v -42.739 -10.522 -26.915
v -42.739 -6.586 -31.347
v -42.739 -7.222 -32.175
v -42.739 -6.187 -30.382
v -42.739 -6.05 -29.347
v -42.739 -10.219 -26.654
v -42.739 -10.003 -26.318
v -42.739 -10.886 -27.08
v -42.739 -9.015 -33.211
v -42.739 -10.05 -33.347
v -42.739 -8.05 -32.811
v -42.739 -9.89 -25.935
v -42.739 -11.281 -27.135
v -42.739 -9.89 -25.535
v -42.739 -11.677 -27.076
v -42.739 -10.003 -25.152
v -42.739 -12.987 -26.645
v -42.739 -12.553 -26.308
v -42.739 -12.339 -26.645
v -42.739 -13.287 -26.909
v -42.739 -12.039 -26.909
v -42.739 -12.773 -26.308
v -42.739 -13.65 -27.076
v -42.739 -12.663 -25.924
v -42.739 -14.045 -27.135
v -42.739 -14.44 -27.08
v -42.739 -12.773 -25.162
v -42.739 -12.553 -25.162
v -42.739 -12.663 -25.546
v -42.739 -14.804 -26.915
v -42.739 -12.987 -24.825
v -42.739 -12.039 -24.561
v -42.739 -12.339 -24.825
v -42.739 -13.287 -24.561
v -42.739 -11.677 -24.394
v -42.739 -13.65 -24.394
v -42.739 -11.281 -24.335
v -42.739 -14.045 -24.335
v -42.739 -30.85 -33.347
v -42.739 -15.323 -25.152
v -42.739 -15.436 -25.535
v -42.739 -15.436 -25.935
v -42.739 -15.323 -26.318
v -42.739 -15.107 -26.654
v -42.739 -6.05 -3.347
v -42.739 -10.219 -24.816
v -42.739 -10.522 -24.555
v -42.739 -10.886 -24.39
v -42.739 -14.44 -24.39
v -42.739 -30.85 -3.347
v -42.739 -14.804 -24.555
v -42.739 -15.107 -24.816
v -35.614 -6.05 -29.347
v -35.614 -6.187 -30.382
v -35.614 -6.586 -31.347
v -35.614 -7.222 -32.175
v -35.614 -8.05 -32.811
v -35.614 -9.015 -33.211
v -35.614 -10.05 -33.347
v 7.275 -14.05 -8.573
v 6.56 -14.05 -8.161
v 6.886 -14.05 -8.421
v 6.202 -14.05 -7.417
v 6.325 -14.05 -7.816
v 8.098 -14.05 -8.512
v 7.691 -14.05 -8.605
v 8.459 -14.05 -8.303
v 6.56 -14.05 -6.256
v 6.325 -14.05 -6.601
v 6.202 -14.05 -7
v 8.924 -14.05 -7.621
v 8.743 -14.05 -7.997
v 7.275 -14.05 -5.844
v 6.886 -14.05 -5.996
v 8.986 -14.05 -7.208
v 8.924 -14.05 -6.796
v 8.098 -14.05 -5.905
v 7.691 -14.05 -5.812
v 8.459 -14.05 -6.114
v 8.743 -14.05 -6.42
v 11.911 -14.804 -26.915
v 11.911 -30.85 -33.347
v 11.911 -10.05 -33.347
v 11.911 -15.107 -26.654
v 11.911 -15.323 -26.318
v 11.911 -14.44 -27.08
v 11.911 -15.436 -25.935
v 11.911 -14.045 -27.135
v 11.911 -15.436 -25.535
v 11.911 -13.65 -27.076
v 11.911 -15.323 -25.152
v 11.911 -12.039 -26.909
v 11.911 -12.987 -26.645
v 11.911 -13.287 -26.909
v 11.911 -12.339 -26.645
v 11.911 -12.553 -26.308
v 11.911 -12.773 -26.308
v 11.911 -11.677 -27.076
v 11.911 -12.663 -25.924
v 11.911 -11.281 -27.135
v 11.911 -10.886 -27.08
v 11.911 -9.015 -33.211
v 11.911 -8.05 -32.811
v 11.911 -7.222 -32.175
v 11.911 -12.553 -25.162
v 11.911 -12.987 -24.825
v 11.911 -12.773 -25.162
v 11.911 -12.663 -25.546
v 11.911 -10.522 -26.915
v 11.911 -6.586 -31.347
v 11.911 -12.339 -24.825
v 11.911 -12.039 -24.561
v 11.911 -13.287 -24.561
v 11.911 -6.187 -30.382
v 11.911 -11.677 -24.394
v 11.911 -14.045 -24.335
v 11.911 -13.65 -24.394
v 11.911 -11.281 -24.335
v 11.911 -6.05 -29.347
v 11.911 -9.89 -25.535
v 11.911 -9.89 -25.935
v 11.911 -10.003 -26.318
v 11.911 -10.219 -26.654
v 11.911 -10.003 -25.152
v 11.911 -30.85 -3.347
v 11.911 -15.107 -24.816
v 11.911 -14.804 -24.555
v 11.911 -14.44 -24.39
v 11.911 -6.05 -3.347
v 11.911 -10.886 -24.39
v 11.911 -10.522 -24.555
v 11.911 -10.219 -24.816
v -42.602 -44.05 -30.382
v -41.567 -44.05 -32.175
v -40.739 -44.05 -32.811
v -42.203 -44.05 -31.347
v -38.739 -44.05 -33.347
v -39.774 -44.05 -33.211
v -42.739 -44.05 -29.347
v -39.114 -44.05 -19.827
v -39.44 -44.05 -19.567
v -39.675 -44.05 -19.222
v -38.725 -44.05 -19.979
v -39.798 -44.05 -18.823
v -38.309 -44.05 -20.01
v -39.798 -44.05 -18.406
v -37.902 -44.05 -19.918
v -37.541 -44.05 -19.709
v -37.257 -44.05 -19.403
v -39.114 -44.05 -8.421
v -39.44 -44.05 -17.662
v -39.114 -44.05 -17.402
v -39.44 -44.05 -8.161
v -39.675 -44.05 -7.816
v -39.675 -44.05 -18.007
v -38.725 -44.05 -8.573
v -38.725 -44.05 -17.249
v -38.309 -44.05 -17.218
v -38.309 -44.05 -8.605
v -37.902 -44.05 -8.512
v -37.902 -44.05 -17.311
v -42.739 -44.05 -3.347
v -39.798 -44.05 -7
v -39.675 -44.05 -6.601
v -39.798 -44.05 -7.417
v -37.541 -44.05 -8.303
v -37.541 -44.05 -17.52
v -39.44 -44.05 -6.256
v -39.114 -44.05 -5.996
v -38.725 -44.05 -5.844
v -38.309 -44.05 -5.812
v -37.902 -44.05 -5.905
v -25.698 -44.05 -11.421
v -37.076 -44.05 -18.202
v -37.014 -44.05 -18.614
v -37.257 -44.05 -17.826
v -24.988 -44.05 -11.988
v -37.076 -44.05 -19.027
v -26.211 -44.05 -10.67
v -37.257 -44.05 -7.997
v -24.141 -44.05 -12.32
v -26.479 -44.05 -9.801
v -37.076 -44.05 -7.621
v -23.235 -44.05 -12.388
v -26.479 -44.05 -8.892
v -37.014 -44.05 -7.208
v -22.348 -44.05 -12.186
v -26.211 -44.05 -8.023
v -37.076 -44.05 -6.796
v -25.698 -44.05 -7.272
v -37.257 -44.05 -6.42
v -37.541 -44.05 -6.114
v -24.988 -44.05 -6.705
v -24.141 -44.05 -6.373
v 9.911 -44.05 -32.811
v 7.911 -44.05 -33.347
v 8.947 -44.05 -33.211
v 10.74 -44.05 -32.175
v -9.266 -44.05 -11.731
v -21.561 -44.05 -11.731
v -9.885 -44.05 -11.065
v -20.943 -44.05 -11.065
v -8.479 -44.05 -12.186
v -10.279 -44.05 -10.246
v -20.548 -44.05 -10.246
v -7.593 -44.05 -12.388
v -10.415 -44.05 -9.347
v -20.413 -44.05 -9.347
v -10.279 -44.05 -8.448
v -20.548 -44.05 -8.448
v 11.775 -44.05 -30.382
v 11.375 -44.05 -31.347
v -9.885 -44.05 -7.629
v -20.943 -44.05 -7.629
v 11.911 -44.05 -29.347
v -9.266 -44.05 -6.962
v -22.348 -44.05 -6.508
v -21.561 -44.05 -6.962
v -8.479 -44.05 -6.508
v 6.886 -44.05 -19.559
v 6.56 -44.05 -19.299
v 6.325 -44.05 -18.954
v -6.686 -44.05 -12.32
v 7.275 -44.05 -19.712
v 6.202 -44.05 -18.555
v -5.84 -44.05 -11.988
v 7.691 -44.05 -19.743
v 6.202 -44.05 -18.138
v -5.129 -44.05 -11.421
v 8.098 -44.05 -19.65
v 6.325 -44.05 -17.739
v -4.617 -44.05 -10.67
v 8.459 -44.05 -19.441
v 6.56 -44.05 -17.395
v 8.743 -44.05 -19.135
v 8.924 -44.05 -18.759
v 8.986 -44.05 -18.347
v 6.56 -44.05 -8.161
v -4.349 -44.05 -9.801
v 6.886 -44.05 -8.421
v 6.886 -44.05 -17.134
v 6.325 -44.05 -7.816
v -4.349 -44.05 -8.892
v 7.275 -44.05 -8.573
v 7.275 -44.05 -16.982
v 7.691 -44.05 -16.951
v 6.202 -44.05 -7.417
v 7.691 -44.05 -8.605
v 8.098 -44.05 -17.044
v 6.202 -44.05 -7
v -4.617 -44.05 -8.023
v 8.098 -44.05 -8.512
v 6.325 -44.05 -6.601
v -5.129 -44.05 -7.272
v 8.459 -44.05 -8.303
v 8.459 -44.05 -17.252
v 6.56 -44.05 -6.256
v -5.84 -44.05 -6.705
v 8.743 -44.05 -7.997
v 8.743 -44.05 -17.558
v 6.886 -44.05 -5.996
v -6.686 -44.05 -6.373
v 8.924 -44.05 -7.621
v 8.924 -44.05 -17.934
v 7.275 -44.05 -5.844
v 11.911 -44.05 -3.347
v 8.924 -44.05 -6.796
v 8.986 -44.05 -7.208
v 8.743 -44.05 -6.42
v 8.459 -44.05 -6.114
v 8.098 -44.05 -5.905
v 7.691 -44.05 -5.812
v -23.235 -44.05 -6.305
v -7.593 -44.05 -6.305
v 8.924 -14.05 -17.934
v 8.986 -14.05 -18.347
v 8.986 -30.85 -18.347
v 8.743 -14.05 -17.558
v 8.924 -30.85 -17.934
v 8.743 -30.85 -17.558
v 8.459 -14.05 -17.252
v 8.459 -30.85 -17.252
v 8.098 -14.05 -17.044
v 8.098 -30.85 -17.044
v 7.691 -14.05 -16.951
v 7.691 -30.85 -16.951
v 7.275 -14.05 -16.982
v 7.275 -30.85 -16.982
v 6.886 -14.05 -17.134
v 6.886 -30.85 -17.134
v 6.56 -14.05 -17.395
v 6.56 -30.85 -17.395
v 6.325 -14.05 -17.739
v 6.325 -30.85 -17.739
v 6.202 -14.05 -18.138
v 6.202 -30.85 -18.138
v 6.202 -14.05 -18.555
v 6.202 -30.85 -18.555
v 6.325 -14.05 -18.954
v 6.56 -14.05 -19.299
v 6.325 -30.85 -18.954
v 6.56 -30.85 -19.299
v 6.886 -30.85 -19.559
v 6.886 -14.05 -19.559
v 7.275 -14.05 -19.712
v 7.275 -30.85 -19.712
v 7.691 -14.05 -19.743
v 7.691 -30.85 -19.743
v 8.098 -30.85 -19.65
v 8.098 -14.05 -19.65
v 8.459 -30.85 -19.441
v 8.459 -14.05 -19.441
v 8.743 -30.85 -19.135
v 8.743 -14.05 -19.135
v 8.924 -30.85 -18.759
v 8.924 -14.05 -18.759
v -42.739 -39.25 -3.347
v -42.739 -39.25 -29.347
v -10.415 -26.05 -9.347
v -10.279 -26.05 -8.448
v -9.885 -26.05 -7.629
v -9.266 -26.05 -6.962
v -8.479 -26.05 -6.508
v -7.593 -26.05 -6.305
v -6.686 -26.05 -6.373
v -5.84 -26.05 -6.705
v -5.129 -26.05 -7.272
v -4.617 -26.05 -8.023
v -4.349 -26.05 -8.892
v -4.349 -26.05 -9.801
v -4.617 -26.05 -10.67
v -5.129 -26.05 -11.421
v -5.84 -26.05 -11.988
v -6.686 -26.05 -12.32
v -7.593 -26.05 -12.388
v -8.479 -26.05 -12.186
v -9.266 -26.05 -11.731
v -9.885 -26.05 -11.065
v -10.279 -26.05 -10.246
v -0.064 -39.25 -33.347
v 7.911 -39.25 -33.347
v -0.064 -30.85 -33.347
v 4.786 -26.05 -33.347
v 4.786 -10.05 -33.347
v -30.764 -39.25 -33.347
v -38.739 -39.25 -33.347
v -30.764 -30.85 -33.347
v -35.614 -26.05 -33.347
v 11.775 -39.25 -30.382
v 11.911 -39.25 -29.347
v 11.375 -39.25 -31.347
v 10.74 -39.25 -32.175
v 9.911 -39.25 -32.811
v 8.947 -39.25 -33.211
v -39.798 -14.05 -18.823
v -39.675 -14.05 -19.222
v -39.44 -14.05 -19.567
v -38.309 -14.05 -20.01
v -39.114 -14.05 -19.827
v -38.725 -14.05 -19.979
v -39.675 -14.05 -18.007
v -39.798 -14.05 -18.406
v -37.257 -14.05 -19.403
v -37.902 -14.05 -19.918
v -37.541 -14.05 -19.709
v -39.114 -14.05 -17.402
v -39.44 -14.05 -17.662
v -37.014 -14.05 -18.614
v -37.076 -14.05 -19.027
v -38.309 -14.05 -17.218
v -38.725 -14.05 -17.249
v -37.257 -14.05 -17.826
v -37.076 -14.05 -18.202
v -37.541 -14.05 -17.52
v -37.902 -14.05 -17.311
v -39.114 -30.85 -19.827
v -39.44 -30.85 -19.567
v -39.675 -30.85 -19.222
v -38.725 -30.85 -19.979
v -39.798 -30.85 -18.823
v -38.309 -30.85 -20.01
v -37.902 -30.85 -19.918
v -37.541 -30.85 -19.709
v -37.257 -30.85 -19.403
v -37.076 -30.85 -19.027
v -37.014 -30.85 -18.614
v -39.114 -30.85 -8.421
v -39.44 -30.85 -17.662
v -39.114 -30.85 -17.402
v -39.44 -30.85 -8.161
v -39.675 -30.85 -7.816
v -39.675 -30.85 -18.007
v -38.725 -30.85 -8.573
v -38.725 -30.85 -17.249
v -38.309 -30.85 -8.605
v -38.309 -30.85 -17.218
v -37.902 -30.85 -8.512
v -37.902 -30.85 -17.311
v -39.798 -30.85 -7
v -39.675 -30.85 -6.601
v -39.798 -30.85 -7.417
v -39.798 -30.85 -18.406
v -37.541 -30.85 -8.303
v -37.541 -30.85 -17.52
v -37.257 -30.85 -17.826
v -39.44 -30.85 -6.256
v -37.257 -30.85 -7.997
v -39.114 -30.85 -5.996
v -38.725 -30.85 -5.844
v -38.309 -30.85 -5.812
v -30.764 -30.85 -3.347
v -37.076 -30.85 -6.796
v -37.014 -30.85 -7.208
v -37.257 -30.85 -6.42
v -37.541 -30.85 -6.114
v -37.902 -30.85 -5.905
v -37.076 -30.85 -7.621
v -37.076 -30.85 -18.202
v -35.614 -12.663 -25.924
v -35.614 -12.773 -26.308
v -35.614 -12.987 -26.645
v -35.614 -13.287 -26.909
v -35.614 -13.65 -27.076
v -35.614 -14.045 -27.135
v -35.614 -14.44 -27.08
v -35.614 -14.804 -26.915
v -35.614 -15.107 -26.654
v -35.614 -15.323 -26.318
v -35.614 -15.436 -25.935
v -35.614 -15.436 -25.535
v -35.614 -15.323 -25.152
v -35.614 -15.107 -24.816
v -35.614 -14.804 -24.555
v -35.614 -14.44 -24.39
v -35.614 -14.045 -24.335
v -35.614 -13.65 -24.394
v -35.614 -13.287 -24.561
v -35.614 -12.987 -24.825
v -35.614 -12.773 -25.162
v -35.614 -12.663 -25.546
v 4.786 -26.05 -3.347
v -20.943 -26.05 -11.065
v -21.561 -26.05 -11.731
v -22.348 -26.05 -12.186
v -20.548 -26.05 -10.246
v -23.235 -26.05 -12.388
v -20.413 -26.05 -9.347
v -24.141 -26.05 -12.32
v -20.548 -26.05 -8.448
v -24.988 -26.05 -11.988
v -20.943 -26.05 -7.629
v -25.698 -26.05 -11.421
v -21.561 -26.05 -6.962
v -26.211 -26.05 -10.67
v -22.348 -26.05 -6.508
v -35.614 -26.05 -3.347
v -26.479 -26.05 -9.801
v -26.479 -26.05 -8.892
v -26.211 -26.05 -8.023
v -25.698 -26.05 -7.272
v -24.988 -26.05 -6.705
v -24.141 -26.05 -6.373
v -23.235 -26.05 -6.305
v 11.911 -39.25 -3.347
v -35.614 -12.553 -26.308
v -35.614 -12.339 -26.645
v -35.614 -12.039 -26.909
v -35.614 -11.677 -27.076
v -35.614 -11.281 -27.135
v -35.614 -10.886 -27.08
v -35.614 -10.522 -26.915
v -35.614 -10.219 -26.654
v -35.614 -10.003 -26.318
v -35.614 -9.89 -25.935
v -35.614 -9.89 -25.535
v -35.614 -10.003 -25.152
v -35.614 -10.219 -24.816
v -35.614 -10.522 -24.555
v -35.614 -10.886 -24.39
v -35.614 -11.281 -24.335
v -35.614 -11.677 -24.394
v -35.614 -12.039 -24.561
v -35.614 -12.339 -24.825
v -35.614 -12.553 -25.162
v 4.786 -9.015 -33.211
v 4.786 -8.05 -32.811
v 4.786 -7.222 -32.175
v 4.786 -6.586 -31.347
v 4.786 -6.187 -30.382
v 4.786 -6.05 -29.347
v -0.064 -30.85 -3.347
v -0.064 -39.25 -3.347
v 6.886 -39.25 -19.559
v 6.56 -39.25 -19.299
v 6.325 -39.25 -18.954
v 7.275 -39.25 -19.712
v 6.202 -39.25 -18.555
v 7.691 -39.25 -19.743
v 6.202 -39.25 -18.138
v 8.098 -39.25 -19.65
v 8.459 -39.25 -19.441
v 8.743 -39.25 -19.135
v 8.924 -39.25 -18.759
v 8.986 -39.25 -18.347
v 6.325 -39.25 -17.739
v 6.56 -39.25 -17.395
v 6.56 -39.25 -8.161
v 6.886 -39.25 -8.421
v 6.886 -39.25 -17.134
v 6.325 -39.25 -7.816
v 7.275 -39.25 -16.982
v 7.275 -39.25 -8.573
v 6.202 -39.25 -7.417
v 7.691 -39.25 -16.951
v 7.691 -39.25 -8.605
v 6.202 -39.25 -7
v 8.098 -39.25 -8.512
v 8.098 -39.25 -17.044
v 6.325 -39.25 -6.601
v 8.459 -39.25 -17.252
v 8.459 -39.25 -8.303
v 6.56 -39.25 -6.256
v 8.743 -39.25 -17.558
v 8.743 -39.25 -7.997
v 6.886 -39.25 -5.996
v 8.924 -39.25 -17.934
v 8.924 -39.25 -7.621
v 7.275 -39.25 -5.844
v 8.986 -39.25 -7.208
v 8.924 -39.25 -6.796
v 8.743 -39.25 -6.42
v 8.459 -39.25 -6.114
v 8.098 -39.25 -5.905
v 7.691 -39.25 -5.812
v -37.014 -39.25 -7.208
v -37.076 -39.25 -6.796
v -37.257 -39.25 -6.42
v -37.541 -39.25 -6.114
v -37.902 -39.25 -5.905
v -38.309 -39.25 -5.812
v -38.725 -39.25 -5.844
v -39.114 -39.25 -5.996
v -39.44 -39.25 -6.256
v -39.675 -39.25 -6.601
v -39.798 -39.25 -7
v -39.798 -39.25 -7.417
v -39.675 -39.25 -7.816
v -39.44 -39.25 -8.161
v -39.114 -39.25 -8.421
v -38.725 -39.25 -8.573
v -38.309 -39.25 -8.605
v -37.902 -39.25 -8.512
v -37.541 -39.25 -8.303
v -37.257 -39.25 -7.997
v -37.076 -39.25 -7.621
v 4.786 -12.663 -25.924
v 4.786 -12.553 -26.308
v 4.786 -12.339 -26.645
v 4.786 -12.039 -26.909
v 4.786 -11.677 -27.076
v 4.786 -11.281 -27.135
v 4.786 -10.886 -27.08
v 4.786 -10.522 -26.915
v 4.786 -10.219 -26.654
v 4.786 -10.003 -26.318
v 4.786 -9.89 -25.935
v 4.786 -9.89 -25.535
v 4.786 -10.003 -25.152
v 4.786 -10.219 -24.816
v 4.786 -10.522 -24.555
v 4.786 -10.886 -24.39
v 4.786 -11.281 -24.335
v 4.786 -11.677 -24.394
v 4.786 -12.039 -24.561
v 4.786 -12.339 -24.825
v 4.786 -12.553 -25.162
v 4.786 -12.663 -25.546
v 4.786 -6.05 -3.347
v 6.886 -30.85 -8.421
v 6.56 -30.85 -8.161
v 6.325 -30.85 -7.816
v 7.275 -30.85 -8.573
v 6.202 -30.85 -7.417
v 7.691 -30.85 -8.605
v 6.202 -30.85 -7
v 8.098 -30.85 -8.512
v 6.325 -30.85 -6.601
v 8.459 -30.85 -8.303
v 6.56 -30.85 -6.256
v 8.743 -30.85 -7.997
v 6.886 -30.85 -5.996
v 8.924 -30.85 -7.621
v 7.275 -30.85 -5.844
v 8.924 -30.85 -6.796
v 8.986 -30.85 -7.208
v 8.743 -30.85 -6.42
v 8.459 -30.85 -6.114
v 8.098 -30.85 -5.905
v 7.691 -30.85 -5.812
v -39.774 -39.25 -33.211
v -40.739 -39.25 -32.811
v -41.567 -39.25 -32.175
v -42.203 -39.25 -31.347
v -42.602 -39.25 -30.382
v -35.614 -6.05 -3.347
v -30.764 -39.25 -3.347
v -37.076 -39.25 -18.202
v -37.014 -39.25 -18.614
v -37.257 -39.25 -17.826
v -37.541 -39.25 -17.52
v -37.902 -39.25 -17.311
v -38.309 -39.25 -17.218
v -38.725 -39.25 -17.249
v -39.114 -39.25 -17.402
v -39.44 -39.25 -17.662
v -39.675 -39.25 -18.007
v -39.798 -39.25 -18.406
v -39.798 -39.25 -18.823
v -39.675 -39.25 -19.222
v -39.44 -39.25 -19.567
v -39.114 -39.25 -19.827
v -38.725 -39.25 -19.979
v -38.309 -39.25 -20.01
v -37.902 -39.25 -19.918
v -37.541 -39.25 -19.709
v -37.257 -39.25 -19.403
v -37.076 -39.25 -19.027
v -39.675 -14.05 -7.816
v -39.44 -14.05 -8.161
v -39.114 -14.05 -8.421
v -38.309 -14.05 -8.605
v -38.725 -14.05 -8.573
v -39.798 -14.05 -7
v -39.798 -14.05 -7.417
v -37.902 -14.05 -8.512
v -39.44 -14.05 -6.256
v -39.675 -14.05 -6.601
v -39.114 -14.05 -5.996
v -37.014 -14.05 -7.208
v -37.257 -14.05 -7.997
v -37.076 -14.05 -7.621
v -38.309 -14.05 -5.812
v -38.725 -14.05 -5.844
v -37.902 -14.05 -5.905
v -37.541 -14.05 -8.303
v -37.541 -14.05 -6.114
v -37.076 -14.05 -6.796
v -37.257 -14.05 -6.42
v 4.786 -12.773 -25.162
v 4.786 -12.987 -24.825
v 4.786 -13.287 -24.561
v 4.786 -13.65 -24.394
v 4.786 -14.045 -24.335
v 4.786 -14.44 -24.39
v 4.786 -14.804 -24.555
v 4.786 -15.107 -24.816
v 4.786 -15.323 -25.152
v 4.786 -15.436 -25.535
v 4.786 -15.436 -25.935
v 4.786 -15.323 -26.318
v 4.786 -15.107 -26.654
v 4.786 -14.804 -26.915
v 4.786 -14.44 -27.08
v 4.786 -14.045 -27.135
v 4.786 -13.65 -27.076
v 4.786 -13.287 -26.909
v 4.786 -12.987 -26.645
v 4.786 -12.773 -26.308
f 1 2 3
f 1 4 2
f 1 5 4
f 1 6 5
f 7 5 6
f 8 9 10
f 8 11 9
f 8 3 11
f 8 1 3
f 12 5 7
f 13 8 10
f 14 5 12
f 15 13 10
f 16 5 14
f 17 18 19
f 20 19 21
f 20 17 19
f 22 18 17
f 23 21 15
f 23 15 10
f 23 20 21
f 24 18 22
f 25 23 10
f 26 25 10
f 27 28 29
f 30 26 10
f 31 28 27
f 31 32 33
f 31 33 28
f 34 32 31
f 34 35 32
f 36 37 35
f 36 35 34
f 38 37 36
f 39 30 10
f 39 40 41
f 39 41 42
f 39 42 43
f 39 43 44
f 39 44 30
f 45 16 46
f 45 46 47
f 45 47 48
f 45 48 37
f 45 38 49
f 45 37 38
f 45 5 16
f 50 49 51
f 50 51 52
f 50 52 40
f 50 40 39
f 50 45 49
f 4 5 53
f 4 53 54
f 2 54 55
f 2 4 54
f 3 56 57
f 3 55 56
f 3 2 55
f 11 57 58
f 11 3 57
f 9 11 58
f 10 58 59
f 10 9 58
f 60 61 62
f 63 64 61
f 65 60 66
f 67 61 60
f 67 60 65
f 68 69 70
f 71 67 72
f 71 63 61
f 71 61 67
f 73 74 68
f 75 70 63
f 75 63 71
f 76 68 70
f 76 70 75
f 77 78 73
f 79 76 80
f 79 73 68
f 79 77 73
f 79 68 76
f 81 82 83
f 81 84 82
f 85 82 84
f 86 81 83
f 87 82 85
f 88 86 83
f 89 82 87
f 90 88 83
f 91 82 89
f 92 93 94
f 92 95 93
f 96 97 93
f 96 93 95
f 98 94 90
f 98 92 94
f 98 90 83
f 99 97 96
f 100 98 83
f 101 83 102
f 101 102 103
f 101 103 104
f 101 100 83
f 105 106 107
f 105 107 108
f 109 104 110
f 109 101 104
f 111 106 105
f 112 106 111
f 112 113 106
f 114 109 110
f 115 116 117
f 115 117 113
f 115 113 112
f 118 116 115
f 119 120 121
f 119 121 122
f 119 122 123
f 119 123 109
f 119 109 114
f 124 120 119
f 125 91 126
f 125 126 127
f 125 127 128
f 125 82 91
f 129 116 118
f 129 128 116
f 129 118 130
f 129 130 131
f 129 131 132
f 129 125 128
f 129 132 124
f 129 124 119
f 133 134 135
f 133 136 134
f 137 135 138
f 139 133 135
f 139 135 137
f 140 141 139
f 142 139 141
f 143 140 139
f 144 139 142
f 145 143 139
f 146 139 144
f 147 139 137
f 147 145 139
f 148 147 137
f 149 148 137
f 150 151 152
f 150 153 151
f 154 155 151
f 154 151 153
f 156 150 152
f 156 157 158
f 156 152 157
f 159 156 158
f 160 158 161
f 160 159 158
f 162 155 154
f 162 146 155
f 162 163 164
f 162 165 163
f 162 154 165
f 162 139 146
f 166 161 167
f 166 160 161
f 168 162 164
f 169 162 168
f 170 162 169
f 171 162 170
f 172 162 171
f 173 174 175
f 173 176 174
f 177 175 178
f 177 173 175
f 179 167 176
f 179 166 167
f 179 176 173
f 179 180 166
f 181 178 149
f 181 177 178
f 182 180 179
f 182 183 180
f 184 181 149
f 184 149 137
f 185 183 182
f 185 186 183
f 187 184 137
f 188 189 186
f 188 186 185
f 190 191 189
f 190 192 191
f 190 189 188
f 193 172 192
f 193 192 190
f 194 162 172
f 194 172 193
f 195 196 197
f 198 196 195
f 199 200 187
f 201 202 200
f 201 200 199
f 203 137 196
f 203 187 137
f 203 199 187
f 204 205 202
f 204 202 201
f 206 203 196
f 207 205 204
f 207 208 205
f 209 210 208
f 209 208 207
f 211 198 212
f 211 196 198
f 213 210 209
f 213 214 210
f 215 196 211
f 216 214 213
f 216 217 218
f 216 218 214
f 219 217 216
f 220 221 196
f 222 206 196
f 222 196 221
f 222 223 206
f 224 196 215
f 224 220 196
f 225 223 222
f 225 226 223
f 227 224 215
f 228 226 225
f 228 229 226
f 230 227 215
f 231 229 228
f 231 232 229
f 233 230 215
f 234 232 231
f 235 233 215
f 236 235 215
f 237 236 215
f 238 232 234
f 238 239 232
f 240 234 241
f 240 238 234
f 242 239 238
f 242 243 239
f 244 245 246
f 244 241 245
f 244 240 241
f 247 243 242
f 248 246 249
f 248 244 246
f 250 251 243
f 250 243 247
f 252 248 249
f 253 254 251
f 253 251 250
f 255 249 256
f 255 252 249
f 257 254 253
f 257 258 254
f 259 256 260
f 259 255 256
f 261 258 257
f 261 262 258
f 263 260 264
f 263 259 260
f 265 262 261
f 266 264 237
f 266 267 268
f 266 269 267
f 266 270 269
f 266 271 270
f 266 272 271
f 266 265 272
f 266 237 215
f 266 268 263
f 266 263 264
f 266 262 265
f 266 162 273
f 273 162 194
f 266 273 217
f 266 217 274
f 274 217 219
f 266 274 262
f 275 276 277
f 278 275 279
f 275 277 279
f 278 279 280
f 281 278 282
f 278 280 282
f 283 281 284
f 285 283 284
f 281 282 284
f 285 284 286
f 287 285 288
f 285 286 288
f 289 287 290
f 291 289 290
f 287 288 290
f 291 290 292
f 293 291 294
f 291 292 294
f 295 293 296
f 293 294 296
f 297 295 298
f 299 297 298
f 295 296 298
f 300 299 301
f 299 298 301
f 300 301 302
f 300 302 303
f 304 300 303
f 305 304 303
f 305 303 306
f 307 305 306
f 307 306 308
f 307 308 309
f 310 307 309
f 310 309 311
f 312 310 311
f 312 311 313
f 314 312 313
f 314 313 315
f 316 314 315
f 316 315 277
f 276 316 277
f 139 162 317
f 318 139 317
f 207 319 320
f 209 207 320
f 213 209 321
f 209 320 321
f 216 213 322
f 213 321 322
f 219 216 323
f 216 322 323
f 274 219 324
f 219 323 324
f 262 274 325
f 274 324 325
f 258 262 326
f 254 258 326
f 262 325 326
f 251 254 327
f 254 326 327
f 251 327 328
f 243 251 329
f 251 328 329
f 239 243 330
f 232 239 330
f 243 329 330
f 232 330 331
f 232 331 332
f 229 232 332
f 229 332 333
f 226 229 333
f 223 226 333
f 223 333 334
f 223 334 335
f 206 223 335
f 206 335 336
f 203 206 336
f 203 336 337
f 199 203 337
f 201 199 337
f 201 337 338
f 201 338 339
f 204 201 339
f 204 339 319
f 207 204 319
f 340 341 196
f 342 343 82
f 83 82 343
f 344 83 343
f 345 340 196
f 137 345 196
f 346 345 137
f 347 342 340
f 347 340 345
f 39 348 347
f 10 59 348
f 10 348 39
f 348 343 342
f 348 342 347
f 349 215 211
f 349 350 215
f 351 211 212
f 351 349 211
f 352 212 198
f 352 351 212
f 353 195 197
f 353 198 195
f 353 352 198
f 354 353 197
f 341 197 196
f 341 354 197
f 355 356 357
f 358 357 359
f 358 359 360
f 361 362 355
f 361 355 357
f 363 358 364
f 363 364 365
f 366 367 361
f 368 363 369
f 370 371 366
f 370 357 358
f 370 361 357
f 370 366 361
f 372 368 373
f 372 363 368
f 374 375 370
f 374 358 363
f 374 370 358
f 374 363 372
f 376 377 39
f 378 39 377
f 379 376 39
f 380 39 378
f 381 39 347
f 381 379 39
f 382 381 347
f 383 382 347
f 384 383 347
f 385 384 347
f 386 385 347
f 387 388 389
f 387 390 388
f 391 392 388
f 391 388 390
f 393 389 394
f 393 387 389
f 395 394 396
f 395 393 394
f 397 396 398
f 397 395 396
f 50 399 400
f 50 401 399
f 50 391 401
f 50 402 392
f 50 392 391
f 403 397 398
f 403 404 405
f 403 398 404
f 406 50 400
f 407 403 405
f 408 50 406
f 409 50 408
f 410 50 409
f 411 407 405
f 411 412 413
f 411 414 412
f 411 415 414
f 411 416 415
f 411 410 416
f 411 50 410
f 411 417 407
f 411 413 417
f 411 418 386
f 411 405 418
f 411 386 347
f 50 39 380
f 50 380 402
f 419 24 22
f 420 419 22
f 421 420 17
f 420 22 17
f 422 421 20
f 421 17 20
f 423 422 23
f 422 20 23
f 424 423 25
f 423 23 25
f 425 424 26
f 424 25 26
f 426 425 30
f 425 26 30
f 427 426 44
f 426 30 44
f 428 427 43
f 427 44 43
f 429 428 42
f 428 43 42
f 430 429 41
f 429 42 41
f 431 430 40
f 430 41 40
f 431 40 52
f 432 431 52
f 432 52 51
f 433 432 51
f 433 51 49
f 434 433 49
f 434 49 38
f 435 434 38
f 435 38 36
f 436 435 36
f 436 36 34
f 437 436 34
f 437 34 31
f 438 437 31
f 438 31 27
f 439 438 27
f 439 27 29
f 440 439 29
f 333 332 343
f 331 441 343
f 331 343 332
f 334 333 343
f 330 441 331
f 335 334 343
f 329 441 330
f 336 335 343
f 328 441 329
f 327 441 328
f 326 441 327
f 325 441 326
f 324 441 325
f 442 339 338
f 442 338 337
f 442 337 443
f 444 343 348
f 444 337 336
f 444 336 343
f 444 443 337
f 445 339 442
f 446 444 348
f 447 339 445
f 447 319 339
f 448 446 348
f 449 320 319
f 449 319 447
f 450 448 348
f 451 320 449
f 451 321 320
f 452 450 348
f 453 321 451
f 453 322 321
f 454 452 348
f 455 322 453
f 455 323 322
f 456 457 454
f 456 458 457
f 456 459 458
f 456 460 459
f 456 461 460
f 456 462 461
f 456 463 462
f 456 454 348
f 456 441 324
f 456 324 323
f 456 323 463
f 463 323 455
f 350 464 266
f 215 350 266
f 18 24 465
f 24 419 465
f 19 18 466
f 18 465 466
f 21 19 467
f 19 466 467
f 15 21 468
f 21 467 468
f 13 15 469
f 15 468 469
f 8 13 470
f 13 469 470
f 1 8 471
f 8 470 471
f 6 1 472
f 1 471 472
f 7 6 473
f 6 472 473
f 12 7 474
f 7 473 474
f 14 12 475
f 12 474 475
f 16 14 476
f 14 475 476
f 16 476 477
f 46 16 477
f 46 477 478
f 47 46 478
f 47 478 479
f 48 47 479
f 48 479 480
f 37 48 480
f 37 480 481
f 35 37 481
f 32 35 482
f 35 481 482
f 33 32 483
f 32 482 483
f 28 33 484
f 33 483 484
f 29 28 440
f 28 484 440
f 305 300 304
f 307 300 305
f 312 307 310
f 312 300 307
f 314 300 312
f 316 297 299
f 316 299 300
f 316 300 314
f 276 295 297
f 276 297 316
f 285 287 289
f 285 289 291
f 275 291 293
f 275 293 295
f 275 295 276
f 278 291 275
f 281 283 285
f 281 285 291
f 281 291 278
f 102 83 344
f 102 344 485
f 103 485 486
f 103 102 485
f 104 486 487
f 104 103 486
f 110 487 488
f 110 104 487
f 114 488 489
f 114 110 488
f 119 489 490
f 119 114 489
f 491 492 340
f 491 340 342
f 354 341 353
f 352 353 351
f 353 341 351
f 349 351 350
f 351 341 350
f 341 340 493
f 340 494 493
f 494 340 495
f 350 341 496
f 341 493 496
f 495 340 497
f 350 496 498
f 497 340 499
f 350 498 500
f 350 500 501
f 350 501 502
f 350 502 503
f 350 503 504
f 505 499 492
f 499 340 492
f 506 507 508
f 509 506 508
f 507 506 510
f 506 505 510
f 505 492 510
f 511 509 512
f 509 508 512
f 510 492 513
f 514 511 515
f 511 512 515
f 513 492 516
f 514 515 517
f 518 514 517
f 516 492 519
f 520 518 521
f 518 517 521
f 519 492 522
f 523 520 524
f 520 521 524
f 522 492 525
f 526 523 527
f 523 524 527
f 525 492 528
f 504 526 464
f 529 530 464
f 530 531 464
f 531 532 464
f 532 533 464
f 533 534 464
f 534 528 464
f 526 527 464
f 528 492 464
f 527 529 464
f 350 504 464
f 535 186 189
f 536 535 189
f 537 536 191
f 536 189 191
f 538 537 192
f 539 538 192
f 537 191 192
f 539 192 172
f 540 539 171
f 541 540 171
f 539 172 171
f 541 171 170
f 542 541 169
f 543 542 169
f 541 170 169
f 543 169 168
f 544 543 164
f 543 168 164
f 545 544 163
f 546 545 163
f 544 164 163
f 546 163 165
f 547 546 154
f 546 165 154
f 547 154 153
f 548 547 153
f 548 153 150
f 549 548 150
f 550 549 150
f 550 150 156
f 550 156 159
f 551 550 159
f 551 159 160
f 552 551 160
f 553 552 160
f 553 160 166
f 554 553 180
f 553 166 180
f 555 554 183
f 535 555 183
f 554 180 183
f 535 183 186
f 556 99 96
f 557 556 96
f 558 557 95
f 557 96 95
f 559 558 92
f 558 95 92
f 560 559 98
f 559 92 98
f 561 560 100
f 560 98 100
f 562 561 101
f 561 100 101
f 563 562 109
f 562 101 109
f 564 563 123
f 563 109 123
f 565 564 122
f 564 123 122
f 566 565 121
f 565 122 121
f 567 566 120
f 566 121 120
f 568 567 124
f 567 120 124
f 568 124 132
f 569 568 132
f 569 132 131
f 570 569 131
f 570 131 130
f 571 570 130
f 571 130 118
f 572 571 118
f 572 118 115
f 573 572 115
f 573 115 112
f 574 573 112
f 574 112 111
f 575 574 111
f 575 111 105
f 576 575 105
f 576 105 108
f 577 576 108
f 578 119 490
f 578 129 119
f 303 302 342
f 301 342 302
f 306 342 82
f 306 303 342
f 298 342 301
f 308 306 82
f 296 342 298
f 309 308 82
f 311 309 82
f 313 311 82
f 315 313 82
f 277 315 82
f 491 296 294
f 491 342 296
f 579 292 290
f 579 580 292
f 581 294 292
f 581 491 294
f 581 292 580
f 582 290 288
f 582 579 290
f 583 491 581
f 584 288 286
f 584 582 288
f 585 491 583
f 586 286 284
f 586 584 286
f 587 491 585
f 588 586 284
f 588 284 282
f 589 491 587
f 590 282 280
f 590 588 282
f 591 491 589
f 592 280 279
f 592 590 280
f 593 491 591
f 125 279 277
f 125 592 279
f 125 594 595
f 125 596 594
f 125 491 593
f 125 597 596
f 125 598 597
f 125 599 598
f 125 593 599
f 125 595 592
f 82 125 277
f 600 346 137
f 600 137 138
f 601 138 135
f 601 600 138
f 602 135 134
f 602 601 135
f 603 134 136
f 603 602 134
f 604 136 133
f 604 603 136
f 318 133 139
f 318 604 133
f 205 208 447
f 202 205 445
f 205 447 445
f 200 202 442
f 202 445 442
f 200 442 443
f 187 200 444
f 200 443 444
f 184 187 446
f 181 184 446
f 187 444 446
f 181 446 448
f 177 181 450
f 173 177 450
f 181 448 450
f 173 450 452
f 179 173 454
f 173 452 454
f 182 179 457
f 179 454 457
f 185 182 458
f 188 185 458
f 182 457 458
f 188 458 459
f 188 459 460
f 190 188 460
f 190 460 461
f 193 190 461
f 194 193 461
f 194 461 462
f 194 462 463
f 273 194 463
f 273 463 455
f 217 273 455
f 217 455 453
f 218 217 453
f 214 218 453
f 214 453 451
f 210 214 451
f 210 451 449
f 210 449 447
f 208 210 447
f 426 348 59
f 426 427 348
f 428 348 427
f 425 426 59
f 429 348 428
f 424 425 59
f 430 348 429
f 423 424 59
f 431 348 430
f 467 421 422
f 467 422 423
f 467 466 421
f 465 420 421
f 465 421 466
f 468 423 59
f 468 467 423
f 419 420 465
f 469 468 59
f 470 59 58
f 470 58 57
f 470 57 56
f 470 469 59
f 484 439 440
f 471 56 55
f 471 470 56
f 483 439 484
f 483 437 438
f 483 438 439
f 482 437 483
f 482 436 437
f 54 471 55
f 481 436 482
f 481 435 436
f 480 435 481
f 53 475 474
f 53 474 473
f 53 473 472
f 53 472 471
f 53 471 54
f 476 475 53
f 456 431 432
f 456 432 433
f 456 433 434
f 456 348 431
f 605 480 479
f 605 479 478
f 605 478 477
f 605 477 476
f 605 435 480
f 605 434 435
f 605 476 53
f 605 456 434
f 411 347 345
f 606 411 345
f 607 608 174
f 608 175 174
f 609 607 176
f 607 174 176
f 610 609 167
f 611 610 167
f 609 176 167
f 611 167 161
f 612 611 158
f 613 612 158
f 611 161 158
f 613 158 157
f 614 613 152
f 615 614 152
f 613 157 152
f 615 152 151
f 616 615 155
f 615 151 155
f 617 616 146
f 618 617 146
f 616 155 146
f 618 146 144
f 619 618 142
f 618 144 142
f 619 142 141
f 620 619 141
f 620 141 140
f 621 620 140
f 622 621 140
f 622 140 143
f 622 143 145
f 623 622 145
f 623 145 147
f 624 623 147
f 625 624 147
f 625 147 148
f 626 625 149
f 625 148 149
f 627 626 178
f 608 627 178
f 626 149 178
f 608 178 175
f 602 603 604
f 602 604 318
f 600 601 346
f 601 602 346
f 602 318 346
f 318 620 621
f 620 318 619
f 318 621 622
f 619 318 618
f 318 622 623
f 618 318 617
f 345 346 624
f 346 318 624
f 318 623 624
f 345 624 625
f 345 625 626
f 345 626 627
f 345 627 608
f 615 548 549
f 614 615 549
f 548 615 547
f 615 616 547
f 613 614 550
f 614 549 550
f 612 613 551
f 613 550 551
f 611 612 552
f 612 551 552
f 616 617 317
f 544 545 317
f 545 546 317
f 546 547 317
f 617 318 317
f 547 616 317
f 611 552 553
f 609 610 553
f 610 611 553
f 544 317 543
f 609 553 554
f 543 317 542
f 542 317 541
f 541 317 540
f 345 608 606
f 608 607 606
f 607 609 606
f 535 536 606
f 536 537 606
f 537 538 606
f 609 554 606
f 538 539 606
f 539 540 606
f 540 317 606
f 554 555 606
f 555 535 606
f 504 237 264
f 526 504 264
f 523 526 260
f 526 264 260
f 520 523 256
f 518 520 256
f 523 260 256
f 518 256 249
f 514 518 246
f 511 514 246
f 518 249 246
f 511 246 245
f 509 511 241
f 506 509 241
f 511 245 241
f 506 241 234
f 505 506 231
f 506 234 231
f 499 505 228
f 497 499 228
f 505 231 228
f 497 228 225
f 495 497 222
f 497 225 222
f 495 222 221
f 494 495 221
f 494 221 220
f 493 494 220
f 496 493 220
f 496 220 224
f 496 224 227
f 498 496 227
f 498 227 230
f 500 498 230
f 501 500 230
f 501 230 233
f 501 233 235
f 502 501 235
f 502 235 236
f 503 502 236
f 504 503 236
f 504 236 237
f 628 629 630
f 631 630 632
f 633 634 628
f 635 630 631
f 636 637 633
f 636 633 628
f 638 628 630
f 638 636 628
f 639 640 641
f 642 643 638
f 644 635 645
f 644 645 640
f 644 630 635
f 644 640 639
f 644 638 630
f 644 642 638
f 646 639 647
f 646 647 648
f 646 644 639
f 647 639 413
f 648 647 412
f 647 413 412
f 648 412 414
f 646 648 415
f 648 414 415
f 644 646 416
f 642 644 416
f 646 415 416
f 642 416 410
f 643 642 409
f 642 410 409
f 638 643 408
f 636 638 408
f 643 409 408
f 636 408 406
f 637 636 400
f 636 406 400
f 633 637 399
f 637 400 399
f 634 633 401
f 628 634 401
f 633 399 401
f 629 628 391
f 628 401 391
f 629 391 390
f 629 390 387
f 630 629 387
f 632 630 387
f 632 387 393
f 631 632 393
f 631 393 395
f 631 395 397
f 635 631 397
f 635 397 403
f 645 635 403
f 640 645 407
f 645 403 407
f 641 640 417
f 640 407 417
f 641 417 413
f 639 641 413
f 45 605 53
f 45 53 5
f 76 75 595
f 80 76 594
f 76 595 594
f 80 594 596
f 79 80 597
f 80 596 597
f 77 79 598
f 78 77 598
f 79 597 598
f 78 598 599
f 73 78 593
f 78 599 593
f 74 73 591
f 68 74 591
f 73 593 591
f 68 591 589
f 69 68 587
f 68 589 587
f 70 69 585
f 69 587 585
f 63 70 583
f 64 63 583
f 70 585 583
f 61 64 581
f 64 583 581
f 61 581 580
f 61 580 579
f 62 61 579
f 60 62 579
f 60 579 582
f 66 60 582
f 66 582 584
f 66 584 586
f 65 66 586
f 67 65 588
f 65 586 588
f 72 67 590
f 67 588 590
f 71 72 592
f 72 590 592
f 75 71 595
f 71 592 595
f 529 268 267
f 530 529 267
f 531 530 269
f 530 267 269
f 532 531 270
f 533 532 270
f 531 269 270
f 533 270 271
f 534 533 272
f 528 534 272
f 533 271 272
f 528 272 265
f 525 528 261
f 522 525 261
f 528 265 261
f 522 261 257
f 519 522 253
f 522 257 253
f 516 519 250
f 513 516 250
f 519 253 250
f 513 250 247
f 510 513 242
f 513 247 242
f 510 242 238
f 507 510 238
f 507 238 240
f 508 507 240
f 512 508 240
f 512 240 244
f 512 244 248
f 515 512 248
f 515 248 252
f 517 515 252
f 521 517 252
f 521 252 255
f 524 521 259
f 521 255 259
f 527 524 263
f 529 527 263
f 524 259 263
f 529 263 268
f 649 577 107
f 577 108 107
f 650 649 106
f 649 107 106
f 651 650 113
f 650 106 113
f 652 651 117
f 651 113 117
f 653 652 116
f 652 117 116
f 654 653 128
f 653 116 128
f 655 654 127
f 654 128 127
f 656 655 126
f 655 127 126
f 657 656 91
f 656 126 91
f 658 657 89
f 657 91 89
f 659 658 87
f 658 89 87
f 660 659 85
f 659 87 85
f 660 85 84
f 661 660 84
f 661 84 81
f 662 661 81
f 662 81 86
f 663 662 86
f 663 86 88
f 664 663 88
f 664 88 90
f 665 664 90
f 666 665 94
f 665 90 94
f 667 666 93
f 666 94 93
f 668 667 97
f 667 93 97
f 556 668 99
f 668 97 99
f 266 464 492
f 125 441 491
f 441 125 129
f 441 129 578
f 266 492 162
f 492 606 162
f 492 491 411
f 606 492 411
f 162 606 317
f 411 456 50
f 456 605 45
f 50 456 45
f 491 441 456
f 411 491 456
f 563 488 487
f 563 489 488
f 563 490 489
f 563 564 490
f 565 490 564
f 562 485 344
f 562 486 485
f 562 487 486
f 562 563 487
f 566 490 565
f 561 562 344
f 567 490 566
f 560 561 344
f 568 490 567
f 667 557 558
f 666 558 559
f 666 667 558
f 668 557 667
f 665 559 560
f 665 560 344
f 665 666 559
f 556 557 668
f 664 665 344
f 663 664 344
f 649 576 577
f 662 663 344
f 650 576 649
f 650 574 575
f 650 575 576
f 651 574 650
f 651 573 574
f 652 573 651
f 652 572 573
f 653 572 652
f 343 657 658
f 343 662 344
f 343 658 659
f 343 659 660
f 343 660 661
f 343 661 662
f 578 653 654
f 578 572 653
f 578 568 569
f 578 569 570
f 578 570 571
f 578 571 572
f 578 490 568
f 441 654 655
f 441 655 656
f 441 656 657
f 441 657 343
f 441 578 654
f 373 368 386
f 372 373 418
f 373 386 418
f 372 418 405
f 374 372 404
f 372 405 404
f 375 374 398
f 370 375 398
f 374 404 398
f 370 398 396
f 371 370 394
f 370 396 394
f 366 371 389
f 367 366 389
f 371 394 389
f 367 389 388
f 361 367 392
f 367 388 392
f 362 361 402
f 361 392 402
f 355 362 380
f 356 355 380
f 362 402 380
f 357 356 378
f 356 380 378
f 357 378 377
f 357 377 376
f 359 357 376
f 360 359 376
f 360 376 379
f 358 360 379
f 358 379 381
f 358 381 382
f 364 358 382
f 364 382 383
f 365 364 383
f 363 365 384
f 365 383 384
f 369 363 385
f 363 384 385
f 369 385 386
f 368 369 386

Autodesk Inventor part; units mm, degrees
ref_plane "YZ Plane" through (0, 0, 0) normal (1, 0, 0) x (0, 1, 0)
ref_plane "XZ Plane" through (0, 0, 0) normal (0, 1, 0) x (-1, 0, 0)
ref_plane "XY Plane" through (0, 0, 0) normal (0, 0, 1) x (1, 0, 0)
ref_plane "Work Plane1" through (-1.4137, -31.0503, -3.3468) normal (0, 0, -1) x (-1, 0, 0)
sketch "Sketch1" plane through (-1.4137, -31.0503, -3.3468) normal (0, 0, -1) x (-1, 0, 0)
  line L0 (41.325, -8) -> (41.325, 0)
  line L1 (29.55, -8) -> (29.55, 0)
  line L2 (44, -8) -> (44, 0) projected
  line L3 (14, 34) -> (14, 6)
  line L4 (14, 5) -> (29.35, 5)
  line L5 (29.35, 5) -> (29.35, -13)
  line L6 (29.35, -13) -> (14, -13)
  line L7 (14, -13) -> (14, 5)
  line L8 (29.35, 5) -> (41.325, 5)
  line L9 (41.325, 5) -> (41.325, 0.2)
  line L10 (41.325, 0.2) -> (29.35, 0.2)
  line L11 (29.35, 0.2) -> (29.35, 5)
  line L12 (29.35, -13) -> (41.325, -13)
  line L13 (41.325, -13) -> (41.325, -8.2)
  line L14 (41.325, -8.2) -> (29.35, -8.2)
  line L15 (29.35, -8.2) -> (29.35, -13)
  line L16 (30, 0) -> (34, 0) projected
  line L17 (34, -8) -> (30, -8) projected
  line L18 (41.325, 5) -> (34.2, 5)
  line L19 (34.2, 5) -> (34.2, 25)
  line L20 (34.2, 25) -> (41.325, 25)
  line L21 (41.325, 25) -> (41.325, 5)
  point P0 (-1.4137, 31.0503)
  point P1 (34, 21.1361)
  point P2 (34.2, 5)
  point P3 (29.35, -8.2)
  point P4 (29.35, 0.2)
  dimension "d0" = 5
  dimension "d1" = 0
  dimension "d2" = 0.2
  dimension "d3" = 5
  dimension "d4" = 0.2
  dimension "d5" = 0.2
  dimension "d6" = 20
  dimension "d7" = 0.2
extrude "Extrusion1" add sketch "Sketch1" along normal blind 30
sketch "Sketch2" plane through (-35.6137, -26.0503, -3.3468) normal (0, 1, 0) x (1, 0, 0)
  circle A0 centre (12.1511, -14.3969) radius 3 construction
  circle A1 centre (12.1511, 6) radius 3.05
  line L0 (-7.125, 0) -> (0, 0) projected
  point P0 (35.6137, -3.3468)
  dimension "d10" = 6.1
  dimension "d13" = 6
extrude "Extrusion2" cut sketch "Sketch2" against normal blind 25.4
sketch "Sketch3" plane through (-42.7387, -30.8503, -3.3468) normal (-1, 0, 0) x (0, 0, 1)
  circle A0 centre (-22.3882, 16.8) radius 1.4 projected
  point P0 (3.3468, 30.8503)
extrude "Extrusion3" cut sketch "Sketch3" against normal blind 30
fillet "Fillet1" radius 4 2 edges at (-39.1762, -6.0503, -33.3468) (-42.7387, -41.6503, -33.3468)
mirror "Mirror1" about plane through (-15.4137, -26.0503, -3.3468) normal (1, 0, 0) of "Extrusion1", "Extrusion2", "Extrusion3", "Fillet1"
sketch "Sketch4" plane through (-42.7387, -44.0503, -29.3468) normal (0, -1, 0) x (1, 0, 0)
  arc A0 (50.65, -4) -> (54.65, 0) centre (50.65, 0) ccw projected
  line L0 (54.65, 26) -> (54.65, 0) projected
  line L1 (0, 26) -> (54.65, 26) projected
  line L2 (0, 26) -> (0, 0) projected
  arc A1 (0, 0) -> (4, -4) centre (4, 0) ccw projected
  line L3 (4, -4) -> (50.65, -4) projected
  circle A2 centre (35.3739, 20) radius 3.05 projected
  circle A3 centre (19.2761, 20) radius 3.05 projected
  circle A4 centre (4.325, 31.6031) radius 1.45 projected
  circle A5 centre (4.325, 22.1383) radius 1.4
  circle A6 centre (4.325, 10.7325) radius 1.4
  circle A7 centre (50.325, 22.1383) radius 1.4
  circle A8 centre (50.325, 11) radius 1.4
  point P0 (42.7387, 29.3468)
  dimension "d17" = 2.8
  dimension "d18" = 2.8
  dimension "d19" = 2.8
  dimension "d20" = 2.8
  dimension "d21" = 4.325
  dimension "d22" = 4.325
  dimension "d23" = 4.325
extrude "Extrusion4" cut sketch "Sketch4" against normal blind 30 contours A5 | A6 | A7 | A8
sketch "Skizze5" plane through (11.9113, -30.8503, -3.3468) normal (1, 0, 0) x (0, 0, -1)
  circle A0 centre (22.3882, 19.5744) radius 1.4 projected
  circle A1 centre (22.3882, 19.5744) radius 1.4
  point P0 (-3.3468, 30.8503)
  dimension "d26" = 2.8
extrude "Extrusion5" cut sketch "Skizze5" against normal through all
equation "\"d22\" = d21"
equation "\"d23\" = d21"
properties part number "30_Cube_Z_Focus_Drylin_manual_base_lightsheet_v3"
